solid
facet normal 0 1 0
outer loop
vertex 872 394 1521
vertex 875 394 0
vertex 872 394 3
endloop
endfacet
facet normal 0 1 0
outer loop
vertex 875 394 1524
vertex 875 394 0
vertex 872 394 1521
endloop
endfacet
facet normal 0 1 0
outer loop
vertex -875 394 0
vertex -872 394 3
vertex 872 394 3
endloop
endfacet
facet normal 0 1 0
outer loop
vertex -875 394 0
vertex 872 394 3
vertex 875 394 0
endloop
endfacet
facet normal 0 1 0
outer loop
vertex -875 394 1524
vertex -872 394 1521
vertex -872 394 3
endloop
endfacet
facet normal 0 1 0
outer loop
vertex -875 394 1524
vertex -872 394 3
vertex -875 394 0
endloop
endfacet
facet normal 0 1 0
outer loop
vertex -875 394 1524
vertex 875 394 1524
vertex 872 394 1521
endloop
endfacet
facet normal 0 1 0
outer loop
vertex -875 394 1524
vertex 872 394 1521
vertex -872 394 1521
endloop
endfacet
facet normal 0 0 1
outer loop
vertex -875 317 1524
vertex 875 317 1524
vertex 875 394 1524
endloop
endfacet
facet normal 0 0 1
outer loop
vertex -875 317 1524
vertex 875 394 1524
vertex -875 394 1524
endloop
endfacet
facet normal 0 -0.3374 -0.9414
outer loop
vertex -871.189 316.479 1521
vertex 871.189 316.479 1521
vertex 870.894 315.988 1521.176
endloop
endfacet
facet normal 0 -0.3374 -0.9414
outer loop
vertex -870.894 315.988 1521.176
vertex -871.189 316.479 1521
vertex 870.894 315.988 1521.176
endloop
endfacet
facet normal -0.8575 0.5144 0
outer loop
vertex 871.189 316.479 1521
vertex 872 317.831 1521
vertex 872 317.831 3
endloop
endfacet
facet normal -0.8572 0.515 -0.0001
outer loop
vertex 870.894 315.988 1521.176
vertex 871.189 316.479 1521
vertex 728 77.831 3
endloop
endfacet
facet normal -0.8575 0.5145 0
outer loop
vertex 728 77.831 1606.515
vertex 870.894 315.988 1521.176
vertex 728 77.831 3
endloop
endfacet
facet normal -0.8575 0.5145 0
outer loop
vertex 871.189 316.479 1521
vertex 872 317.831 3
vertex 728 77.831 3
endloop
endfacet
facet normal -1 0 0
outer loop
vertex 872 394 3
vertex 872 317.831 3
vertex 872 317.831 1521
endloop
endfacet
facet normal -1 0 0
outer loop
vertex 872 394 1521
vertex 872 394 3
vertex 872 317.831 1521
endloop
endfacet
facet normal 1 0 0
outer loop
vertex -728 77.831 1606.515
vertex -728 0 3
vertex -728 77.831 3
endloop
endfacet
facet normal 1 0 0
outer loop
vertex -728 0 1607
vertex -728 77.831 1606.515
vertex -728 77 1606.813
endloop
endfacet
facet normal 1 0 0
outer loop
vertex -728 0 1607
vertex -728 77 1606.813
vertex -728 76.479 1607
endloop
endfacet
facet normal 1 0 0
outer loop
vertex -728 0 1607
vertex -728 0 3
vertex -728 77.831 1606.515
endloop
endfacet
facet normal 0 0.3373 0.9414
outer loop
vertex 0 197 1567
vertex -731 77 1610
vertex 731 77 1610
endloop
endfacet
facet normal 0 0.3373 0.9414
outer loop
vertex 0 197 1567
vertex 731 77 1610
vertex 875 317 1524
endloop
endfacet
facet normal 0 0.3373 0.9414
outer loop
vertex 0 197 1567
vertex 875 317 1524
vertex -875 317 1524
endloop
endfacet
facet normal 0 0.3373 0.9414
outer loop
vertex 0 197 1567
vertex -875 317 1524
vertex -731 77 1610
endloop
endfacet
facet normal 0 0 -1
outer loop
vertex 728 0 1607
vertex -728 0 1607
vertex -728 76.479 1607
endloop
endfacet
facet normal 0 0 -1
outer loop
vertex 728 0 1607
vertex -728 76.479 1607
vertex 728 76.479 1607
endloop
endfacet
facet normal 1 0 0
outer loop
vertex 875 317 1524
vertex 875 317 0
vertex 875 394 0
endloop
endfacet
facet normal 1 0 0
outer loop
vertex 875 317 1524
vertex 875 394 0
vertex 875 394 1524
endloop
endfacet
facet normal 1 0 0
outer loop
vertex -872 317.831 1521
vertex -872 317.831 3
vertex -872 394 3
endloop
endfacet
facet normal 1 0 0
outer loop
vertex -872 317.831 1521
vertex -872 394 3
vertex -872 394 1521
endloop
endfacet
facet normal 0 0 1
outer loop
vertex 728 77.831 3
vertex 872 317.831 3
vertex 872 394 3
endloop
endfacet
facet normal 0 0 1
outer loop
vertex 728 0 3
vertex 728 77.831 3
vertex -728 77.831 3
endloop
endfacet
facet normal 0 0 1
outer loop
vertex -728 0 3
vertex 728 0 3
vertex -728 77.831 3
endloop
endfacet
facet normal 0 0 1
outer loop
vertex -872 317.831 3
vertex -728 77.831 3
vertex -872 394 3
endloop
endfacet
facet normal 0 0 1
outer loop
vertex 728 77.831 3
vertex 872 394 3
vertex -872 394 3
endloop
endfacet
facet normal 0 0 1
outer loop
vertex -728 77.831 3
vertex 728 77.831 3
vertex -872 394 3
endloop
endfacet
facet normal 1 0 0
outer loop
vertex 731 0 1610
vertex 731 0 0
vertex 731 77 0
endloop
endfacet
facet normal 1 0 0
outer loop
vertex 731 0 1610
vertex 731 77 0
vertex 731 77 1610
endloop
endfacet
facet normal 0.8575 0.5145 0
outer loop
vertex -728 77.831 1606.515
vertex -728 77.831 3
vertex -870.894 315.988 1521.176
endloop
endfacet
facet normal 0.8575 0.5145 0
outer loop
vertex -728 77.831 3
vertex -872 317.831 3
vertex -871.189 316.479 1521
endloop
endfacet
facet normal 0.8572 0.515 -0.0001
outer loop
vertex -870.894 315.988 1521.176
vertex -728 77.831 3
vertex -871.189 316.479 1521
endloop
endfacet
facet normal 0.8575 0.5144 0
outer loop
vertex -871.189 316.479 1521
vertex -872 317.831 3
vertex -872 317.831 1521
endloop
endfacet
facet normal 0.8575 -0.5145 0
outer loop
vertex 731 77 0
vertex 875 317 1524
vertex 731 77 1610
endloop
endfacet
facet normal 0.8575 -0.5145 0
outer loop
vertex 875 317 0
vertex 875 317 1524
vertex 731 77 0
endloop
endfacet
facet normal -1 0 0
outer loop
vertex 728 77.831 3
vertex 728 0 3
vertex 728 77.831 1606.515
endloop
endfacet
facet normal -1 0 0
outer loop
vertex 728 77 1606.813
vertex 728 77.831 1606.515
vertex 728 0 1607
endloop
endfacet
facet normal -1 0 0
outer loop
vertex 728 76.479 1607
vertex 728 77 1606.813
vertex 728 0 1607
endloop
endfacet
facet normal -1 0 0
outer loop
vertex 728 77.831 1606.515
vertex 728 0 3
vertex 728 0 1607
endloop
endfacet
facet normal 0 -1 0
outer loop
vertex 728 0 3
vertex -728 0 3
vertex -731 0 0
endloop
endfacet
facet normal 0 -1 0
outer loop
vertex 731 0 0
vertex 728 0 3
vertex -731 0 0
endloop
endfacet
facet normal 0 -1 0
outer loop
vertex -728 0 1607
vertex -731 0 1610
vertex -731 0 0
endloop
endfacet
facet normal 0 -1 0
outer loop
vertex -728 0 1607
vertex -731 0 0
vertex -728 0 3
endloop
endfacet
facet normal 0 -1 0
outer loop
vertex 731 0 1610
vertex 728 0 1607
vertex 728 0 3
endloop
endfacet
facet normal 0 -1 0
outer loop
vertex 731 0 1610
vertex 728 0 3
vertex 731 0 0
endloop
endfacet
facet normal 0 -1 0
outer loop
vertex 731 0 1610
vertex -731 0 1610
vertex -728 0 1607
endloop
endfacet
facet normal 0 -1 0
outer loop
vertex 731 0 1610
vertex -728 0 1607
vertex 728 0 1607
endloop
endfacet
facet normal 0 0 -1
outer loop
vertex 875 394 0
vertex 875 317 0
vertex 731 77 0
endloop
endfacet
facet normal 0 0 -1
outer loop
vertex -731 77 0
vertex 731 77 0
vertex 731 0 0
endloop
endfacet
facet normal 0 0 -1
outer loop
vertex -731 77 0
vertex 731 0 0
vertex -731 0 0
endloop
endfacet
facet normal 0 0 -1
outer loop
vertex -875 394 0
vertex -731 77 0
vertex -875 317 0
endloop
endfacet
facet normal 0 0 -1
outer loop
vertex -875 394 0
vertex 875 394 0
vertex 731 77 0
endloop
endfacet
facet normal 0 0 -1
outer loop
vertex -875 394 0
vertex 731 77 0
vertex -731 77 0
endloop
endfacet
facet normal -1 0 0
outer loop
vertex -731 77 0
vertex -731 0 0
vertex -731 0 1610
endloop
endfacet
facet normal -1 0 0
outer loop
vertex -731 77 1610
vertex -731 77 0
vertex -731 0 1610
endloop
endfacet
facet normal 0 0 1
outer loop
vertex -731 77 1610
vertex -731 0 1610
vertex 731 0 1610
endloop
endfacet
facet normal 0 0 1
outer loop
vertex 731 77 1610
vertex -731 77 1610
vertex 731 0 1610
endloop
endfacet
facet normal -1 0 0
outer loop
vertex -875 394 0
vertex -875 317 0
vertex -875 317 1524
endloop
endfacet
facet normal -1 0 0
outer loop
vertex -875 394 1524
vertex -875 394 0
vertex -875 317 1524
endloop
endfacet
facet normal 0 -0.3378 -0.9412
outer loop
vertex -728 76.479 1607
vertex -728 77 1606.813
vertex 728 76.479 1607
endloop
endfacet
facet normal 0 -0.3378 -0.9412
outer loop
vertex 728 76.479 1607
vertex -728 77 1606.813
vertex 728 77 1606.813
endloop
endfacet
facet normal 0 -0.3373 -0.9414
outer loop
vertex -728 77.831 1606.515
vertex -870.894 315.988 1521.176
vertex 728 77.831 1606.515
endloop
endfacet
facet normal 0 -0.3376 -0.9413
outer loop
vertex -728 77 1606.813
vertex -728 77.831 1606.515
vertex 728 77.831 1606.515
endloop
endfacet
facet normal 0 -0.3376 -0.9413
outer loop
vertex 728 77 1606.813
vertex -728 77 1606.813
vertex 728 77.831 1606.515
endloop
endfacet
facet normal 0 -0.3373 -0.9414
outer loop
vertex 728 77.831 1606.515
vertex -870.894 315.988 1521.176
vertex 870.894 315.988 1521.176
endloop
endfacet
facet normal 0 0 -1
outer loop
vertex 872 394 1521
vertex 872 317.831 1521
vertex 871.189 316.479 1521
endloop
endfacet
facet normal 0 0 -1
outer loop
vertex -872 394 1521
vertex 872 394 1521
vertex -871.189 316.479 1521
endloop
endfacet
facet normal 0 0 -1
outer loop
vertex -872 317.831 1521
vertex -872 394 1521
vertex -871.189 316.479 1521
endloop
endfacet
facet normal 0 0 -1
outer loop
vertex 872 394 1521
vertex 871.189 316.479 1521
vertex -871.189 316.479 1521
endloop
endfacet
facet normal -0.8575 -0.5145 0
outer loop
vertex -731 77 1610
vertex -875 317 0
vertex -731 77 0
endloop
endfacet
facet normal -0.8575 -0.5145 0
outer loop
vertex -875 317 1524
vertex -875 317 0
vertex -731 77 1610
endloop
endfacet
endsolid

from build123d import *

# Parameters (mm, degrees)
F0_W        = 1462
F0_H        = 1610
F1_DEPTH    = 77
F3_W        = 1750
F3_H        = 1524
F4_DEPTH    = 77
F1_FACE_W   = 1462
F1_FACE_H   = 1610
F4_FACE_W   = 1750
F4_FACE_H   = 1524
F6_T        = 3
F6_T3_DEPTH = 1756
F6_T5_DEPTH = 1616


# Not quite as in the source:
# - a shell that OpenCascade refuses in one call is made with other operations: the cavity is built on its own and cut out


with BuildPart() as f1:
    # F0 (on Front) → F1 (new body)
    with BuildSketch(Plane.XZ):
        with Locations((0, 805)):
            Rectangle(F0_W, F0_H)
    extrude(amount=-F1_DEPTH)



with BuildPart() as f4:
    # F3 (on offset) → F4 (new body)
    with BuildSketch(Plane(origin=(0, 317, 0), x_dir=(-1, 0, 0), z_dir=(0, 1, 0))):
        with Locations((0, 762)):
            Rectangle(F3_W, F3_H)
    extrude(amount=F4_DEPTH)


with BuildPart() as f1_1:
    add(f1.part)

    add(f4.part)  # F5 merges F4
    # F1_face (on face) → F5 section 0
    with BuildSketch(Plane(origin=(0, 77, 805), x_dir=(1, 0, 0), z_dir=(0, 1, 0))):
        Rectangle(F1_FACE_W, F1_FACE_H)
    # F4_face (on face) → F5 section 1
    with BuildSketch(Plane(origin=(0, 317, 762), x_dir=(-1, 0, 0), z_dir=(0, -1, 0))):
        Rectangle(F4_FACE_W, F4_FACE_H)
    loft()

    # F6: shell of thickness 3, made by hand


with BuildPart() as f6_core1:
    # F6_t2: copy of F1
    add(f1_1.part)

    # the walls: a layer under each face that stays
    f6_faces = [f6_core1.faces().sort_by_distance(p)[0] for p in [
        (0, 197, 0),
        (875, 355.5, 762),
        (-875, 355.5, 762),
        (0, 355.5, 1524),
        (803, 197, 783.5),
        (-803, 197, 783.5),
        (-731, 38.5, 805),
        (731, 38.5, 805),
        (0, 197, 1567),
        (0, 38.5, 1610),
    ]]
    thicken(f6_faces, amount=-F6_T, mode=Mode.SUBTRACT)

    # F6_s4 → F6_t3 (cut)
    with BuildSketch(Plane.YZ.offset(-878)):
        Polygon((317.010119904, 1524.0582415924), (317, 1521), (316.4787279914, 1521), (315.988009604, 1521.1758407555), align=None)
    extrude(amount=F6_T3_DEPTH, mode=Mode.SUBTRACT)

    # F6_s6 → F6_t5 (cut)
    with BuildSketch(Plane.XY.offset(-3)):
        Polygon((731.0557247878, 76.9845651273), (728.4275212229, 78.5434872663), (728, 77.8309518948), (728, 77), align=None)
        Polygon((-731.0557247878, 76.9845651273), (-728.4275212229, 78.5434872663), (-728, 77.8309518948), (-728, 77), align=None)
    extrude(amount=F6_T5_DEPTH, mode=Mode.SUBTRACT)


with BuildPart() as f1_2:
    add(f1_1.part)

    # what is left inside the walls is the cavity
    f6_cavity = [f6_core1.part.solids().sort_by_distance(p)[0] for p in [
        (0, 393.97, 509),
    ]]
    add(f6_cavity, mode=Mode.SUBTRACT)


solid = f1_2.part
